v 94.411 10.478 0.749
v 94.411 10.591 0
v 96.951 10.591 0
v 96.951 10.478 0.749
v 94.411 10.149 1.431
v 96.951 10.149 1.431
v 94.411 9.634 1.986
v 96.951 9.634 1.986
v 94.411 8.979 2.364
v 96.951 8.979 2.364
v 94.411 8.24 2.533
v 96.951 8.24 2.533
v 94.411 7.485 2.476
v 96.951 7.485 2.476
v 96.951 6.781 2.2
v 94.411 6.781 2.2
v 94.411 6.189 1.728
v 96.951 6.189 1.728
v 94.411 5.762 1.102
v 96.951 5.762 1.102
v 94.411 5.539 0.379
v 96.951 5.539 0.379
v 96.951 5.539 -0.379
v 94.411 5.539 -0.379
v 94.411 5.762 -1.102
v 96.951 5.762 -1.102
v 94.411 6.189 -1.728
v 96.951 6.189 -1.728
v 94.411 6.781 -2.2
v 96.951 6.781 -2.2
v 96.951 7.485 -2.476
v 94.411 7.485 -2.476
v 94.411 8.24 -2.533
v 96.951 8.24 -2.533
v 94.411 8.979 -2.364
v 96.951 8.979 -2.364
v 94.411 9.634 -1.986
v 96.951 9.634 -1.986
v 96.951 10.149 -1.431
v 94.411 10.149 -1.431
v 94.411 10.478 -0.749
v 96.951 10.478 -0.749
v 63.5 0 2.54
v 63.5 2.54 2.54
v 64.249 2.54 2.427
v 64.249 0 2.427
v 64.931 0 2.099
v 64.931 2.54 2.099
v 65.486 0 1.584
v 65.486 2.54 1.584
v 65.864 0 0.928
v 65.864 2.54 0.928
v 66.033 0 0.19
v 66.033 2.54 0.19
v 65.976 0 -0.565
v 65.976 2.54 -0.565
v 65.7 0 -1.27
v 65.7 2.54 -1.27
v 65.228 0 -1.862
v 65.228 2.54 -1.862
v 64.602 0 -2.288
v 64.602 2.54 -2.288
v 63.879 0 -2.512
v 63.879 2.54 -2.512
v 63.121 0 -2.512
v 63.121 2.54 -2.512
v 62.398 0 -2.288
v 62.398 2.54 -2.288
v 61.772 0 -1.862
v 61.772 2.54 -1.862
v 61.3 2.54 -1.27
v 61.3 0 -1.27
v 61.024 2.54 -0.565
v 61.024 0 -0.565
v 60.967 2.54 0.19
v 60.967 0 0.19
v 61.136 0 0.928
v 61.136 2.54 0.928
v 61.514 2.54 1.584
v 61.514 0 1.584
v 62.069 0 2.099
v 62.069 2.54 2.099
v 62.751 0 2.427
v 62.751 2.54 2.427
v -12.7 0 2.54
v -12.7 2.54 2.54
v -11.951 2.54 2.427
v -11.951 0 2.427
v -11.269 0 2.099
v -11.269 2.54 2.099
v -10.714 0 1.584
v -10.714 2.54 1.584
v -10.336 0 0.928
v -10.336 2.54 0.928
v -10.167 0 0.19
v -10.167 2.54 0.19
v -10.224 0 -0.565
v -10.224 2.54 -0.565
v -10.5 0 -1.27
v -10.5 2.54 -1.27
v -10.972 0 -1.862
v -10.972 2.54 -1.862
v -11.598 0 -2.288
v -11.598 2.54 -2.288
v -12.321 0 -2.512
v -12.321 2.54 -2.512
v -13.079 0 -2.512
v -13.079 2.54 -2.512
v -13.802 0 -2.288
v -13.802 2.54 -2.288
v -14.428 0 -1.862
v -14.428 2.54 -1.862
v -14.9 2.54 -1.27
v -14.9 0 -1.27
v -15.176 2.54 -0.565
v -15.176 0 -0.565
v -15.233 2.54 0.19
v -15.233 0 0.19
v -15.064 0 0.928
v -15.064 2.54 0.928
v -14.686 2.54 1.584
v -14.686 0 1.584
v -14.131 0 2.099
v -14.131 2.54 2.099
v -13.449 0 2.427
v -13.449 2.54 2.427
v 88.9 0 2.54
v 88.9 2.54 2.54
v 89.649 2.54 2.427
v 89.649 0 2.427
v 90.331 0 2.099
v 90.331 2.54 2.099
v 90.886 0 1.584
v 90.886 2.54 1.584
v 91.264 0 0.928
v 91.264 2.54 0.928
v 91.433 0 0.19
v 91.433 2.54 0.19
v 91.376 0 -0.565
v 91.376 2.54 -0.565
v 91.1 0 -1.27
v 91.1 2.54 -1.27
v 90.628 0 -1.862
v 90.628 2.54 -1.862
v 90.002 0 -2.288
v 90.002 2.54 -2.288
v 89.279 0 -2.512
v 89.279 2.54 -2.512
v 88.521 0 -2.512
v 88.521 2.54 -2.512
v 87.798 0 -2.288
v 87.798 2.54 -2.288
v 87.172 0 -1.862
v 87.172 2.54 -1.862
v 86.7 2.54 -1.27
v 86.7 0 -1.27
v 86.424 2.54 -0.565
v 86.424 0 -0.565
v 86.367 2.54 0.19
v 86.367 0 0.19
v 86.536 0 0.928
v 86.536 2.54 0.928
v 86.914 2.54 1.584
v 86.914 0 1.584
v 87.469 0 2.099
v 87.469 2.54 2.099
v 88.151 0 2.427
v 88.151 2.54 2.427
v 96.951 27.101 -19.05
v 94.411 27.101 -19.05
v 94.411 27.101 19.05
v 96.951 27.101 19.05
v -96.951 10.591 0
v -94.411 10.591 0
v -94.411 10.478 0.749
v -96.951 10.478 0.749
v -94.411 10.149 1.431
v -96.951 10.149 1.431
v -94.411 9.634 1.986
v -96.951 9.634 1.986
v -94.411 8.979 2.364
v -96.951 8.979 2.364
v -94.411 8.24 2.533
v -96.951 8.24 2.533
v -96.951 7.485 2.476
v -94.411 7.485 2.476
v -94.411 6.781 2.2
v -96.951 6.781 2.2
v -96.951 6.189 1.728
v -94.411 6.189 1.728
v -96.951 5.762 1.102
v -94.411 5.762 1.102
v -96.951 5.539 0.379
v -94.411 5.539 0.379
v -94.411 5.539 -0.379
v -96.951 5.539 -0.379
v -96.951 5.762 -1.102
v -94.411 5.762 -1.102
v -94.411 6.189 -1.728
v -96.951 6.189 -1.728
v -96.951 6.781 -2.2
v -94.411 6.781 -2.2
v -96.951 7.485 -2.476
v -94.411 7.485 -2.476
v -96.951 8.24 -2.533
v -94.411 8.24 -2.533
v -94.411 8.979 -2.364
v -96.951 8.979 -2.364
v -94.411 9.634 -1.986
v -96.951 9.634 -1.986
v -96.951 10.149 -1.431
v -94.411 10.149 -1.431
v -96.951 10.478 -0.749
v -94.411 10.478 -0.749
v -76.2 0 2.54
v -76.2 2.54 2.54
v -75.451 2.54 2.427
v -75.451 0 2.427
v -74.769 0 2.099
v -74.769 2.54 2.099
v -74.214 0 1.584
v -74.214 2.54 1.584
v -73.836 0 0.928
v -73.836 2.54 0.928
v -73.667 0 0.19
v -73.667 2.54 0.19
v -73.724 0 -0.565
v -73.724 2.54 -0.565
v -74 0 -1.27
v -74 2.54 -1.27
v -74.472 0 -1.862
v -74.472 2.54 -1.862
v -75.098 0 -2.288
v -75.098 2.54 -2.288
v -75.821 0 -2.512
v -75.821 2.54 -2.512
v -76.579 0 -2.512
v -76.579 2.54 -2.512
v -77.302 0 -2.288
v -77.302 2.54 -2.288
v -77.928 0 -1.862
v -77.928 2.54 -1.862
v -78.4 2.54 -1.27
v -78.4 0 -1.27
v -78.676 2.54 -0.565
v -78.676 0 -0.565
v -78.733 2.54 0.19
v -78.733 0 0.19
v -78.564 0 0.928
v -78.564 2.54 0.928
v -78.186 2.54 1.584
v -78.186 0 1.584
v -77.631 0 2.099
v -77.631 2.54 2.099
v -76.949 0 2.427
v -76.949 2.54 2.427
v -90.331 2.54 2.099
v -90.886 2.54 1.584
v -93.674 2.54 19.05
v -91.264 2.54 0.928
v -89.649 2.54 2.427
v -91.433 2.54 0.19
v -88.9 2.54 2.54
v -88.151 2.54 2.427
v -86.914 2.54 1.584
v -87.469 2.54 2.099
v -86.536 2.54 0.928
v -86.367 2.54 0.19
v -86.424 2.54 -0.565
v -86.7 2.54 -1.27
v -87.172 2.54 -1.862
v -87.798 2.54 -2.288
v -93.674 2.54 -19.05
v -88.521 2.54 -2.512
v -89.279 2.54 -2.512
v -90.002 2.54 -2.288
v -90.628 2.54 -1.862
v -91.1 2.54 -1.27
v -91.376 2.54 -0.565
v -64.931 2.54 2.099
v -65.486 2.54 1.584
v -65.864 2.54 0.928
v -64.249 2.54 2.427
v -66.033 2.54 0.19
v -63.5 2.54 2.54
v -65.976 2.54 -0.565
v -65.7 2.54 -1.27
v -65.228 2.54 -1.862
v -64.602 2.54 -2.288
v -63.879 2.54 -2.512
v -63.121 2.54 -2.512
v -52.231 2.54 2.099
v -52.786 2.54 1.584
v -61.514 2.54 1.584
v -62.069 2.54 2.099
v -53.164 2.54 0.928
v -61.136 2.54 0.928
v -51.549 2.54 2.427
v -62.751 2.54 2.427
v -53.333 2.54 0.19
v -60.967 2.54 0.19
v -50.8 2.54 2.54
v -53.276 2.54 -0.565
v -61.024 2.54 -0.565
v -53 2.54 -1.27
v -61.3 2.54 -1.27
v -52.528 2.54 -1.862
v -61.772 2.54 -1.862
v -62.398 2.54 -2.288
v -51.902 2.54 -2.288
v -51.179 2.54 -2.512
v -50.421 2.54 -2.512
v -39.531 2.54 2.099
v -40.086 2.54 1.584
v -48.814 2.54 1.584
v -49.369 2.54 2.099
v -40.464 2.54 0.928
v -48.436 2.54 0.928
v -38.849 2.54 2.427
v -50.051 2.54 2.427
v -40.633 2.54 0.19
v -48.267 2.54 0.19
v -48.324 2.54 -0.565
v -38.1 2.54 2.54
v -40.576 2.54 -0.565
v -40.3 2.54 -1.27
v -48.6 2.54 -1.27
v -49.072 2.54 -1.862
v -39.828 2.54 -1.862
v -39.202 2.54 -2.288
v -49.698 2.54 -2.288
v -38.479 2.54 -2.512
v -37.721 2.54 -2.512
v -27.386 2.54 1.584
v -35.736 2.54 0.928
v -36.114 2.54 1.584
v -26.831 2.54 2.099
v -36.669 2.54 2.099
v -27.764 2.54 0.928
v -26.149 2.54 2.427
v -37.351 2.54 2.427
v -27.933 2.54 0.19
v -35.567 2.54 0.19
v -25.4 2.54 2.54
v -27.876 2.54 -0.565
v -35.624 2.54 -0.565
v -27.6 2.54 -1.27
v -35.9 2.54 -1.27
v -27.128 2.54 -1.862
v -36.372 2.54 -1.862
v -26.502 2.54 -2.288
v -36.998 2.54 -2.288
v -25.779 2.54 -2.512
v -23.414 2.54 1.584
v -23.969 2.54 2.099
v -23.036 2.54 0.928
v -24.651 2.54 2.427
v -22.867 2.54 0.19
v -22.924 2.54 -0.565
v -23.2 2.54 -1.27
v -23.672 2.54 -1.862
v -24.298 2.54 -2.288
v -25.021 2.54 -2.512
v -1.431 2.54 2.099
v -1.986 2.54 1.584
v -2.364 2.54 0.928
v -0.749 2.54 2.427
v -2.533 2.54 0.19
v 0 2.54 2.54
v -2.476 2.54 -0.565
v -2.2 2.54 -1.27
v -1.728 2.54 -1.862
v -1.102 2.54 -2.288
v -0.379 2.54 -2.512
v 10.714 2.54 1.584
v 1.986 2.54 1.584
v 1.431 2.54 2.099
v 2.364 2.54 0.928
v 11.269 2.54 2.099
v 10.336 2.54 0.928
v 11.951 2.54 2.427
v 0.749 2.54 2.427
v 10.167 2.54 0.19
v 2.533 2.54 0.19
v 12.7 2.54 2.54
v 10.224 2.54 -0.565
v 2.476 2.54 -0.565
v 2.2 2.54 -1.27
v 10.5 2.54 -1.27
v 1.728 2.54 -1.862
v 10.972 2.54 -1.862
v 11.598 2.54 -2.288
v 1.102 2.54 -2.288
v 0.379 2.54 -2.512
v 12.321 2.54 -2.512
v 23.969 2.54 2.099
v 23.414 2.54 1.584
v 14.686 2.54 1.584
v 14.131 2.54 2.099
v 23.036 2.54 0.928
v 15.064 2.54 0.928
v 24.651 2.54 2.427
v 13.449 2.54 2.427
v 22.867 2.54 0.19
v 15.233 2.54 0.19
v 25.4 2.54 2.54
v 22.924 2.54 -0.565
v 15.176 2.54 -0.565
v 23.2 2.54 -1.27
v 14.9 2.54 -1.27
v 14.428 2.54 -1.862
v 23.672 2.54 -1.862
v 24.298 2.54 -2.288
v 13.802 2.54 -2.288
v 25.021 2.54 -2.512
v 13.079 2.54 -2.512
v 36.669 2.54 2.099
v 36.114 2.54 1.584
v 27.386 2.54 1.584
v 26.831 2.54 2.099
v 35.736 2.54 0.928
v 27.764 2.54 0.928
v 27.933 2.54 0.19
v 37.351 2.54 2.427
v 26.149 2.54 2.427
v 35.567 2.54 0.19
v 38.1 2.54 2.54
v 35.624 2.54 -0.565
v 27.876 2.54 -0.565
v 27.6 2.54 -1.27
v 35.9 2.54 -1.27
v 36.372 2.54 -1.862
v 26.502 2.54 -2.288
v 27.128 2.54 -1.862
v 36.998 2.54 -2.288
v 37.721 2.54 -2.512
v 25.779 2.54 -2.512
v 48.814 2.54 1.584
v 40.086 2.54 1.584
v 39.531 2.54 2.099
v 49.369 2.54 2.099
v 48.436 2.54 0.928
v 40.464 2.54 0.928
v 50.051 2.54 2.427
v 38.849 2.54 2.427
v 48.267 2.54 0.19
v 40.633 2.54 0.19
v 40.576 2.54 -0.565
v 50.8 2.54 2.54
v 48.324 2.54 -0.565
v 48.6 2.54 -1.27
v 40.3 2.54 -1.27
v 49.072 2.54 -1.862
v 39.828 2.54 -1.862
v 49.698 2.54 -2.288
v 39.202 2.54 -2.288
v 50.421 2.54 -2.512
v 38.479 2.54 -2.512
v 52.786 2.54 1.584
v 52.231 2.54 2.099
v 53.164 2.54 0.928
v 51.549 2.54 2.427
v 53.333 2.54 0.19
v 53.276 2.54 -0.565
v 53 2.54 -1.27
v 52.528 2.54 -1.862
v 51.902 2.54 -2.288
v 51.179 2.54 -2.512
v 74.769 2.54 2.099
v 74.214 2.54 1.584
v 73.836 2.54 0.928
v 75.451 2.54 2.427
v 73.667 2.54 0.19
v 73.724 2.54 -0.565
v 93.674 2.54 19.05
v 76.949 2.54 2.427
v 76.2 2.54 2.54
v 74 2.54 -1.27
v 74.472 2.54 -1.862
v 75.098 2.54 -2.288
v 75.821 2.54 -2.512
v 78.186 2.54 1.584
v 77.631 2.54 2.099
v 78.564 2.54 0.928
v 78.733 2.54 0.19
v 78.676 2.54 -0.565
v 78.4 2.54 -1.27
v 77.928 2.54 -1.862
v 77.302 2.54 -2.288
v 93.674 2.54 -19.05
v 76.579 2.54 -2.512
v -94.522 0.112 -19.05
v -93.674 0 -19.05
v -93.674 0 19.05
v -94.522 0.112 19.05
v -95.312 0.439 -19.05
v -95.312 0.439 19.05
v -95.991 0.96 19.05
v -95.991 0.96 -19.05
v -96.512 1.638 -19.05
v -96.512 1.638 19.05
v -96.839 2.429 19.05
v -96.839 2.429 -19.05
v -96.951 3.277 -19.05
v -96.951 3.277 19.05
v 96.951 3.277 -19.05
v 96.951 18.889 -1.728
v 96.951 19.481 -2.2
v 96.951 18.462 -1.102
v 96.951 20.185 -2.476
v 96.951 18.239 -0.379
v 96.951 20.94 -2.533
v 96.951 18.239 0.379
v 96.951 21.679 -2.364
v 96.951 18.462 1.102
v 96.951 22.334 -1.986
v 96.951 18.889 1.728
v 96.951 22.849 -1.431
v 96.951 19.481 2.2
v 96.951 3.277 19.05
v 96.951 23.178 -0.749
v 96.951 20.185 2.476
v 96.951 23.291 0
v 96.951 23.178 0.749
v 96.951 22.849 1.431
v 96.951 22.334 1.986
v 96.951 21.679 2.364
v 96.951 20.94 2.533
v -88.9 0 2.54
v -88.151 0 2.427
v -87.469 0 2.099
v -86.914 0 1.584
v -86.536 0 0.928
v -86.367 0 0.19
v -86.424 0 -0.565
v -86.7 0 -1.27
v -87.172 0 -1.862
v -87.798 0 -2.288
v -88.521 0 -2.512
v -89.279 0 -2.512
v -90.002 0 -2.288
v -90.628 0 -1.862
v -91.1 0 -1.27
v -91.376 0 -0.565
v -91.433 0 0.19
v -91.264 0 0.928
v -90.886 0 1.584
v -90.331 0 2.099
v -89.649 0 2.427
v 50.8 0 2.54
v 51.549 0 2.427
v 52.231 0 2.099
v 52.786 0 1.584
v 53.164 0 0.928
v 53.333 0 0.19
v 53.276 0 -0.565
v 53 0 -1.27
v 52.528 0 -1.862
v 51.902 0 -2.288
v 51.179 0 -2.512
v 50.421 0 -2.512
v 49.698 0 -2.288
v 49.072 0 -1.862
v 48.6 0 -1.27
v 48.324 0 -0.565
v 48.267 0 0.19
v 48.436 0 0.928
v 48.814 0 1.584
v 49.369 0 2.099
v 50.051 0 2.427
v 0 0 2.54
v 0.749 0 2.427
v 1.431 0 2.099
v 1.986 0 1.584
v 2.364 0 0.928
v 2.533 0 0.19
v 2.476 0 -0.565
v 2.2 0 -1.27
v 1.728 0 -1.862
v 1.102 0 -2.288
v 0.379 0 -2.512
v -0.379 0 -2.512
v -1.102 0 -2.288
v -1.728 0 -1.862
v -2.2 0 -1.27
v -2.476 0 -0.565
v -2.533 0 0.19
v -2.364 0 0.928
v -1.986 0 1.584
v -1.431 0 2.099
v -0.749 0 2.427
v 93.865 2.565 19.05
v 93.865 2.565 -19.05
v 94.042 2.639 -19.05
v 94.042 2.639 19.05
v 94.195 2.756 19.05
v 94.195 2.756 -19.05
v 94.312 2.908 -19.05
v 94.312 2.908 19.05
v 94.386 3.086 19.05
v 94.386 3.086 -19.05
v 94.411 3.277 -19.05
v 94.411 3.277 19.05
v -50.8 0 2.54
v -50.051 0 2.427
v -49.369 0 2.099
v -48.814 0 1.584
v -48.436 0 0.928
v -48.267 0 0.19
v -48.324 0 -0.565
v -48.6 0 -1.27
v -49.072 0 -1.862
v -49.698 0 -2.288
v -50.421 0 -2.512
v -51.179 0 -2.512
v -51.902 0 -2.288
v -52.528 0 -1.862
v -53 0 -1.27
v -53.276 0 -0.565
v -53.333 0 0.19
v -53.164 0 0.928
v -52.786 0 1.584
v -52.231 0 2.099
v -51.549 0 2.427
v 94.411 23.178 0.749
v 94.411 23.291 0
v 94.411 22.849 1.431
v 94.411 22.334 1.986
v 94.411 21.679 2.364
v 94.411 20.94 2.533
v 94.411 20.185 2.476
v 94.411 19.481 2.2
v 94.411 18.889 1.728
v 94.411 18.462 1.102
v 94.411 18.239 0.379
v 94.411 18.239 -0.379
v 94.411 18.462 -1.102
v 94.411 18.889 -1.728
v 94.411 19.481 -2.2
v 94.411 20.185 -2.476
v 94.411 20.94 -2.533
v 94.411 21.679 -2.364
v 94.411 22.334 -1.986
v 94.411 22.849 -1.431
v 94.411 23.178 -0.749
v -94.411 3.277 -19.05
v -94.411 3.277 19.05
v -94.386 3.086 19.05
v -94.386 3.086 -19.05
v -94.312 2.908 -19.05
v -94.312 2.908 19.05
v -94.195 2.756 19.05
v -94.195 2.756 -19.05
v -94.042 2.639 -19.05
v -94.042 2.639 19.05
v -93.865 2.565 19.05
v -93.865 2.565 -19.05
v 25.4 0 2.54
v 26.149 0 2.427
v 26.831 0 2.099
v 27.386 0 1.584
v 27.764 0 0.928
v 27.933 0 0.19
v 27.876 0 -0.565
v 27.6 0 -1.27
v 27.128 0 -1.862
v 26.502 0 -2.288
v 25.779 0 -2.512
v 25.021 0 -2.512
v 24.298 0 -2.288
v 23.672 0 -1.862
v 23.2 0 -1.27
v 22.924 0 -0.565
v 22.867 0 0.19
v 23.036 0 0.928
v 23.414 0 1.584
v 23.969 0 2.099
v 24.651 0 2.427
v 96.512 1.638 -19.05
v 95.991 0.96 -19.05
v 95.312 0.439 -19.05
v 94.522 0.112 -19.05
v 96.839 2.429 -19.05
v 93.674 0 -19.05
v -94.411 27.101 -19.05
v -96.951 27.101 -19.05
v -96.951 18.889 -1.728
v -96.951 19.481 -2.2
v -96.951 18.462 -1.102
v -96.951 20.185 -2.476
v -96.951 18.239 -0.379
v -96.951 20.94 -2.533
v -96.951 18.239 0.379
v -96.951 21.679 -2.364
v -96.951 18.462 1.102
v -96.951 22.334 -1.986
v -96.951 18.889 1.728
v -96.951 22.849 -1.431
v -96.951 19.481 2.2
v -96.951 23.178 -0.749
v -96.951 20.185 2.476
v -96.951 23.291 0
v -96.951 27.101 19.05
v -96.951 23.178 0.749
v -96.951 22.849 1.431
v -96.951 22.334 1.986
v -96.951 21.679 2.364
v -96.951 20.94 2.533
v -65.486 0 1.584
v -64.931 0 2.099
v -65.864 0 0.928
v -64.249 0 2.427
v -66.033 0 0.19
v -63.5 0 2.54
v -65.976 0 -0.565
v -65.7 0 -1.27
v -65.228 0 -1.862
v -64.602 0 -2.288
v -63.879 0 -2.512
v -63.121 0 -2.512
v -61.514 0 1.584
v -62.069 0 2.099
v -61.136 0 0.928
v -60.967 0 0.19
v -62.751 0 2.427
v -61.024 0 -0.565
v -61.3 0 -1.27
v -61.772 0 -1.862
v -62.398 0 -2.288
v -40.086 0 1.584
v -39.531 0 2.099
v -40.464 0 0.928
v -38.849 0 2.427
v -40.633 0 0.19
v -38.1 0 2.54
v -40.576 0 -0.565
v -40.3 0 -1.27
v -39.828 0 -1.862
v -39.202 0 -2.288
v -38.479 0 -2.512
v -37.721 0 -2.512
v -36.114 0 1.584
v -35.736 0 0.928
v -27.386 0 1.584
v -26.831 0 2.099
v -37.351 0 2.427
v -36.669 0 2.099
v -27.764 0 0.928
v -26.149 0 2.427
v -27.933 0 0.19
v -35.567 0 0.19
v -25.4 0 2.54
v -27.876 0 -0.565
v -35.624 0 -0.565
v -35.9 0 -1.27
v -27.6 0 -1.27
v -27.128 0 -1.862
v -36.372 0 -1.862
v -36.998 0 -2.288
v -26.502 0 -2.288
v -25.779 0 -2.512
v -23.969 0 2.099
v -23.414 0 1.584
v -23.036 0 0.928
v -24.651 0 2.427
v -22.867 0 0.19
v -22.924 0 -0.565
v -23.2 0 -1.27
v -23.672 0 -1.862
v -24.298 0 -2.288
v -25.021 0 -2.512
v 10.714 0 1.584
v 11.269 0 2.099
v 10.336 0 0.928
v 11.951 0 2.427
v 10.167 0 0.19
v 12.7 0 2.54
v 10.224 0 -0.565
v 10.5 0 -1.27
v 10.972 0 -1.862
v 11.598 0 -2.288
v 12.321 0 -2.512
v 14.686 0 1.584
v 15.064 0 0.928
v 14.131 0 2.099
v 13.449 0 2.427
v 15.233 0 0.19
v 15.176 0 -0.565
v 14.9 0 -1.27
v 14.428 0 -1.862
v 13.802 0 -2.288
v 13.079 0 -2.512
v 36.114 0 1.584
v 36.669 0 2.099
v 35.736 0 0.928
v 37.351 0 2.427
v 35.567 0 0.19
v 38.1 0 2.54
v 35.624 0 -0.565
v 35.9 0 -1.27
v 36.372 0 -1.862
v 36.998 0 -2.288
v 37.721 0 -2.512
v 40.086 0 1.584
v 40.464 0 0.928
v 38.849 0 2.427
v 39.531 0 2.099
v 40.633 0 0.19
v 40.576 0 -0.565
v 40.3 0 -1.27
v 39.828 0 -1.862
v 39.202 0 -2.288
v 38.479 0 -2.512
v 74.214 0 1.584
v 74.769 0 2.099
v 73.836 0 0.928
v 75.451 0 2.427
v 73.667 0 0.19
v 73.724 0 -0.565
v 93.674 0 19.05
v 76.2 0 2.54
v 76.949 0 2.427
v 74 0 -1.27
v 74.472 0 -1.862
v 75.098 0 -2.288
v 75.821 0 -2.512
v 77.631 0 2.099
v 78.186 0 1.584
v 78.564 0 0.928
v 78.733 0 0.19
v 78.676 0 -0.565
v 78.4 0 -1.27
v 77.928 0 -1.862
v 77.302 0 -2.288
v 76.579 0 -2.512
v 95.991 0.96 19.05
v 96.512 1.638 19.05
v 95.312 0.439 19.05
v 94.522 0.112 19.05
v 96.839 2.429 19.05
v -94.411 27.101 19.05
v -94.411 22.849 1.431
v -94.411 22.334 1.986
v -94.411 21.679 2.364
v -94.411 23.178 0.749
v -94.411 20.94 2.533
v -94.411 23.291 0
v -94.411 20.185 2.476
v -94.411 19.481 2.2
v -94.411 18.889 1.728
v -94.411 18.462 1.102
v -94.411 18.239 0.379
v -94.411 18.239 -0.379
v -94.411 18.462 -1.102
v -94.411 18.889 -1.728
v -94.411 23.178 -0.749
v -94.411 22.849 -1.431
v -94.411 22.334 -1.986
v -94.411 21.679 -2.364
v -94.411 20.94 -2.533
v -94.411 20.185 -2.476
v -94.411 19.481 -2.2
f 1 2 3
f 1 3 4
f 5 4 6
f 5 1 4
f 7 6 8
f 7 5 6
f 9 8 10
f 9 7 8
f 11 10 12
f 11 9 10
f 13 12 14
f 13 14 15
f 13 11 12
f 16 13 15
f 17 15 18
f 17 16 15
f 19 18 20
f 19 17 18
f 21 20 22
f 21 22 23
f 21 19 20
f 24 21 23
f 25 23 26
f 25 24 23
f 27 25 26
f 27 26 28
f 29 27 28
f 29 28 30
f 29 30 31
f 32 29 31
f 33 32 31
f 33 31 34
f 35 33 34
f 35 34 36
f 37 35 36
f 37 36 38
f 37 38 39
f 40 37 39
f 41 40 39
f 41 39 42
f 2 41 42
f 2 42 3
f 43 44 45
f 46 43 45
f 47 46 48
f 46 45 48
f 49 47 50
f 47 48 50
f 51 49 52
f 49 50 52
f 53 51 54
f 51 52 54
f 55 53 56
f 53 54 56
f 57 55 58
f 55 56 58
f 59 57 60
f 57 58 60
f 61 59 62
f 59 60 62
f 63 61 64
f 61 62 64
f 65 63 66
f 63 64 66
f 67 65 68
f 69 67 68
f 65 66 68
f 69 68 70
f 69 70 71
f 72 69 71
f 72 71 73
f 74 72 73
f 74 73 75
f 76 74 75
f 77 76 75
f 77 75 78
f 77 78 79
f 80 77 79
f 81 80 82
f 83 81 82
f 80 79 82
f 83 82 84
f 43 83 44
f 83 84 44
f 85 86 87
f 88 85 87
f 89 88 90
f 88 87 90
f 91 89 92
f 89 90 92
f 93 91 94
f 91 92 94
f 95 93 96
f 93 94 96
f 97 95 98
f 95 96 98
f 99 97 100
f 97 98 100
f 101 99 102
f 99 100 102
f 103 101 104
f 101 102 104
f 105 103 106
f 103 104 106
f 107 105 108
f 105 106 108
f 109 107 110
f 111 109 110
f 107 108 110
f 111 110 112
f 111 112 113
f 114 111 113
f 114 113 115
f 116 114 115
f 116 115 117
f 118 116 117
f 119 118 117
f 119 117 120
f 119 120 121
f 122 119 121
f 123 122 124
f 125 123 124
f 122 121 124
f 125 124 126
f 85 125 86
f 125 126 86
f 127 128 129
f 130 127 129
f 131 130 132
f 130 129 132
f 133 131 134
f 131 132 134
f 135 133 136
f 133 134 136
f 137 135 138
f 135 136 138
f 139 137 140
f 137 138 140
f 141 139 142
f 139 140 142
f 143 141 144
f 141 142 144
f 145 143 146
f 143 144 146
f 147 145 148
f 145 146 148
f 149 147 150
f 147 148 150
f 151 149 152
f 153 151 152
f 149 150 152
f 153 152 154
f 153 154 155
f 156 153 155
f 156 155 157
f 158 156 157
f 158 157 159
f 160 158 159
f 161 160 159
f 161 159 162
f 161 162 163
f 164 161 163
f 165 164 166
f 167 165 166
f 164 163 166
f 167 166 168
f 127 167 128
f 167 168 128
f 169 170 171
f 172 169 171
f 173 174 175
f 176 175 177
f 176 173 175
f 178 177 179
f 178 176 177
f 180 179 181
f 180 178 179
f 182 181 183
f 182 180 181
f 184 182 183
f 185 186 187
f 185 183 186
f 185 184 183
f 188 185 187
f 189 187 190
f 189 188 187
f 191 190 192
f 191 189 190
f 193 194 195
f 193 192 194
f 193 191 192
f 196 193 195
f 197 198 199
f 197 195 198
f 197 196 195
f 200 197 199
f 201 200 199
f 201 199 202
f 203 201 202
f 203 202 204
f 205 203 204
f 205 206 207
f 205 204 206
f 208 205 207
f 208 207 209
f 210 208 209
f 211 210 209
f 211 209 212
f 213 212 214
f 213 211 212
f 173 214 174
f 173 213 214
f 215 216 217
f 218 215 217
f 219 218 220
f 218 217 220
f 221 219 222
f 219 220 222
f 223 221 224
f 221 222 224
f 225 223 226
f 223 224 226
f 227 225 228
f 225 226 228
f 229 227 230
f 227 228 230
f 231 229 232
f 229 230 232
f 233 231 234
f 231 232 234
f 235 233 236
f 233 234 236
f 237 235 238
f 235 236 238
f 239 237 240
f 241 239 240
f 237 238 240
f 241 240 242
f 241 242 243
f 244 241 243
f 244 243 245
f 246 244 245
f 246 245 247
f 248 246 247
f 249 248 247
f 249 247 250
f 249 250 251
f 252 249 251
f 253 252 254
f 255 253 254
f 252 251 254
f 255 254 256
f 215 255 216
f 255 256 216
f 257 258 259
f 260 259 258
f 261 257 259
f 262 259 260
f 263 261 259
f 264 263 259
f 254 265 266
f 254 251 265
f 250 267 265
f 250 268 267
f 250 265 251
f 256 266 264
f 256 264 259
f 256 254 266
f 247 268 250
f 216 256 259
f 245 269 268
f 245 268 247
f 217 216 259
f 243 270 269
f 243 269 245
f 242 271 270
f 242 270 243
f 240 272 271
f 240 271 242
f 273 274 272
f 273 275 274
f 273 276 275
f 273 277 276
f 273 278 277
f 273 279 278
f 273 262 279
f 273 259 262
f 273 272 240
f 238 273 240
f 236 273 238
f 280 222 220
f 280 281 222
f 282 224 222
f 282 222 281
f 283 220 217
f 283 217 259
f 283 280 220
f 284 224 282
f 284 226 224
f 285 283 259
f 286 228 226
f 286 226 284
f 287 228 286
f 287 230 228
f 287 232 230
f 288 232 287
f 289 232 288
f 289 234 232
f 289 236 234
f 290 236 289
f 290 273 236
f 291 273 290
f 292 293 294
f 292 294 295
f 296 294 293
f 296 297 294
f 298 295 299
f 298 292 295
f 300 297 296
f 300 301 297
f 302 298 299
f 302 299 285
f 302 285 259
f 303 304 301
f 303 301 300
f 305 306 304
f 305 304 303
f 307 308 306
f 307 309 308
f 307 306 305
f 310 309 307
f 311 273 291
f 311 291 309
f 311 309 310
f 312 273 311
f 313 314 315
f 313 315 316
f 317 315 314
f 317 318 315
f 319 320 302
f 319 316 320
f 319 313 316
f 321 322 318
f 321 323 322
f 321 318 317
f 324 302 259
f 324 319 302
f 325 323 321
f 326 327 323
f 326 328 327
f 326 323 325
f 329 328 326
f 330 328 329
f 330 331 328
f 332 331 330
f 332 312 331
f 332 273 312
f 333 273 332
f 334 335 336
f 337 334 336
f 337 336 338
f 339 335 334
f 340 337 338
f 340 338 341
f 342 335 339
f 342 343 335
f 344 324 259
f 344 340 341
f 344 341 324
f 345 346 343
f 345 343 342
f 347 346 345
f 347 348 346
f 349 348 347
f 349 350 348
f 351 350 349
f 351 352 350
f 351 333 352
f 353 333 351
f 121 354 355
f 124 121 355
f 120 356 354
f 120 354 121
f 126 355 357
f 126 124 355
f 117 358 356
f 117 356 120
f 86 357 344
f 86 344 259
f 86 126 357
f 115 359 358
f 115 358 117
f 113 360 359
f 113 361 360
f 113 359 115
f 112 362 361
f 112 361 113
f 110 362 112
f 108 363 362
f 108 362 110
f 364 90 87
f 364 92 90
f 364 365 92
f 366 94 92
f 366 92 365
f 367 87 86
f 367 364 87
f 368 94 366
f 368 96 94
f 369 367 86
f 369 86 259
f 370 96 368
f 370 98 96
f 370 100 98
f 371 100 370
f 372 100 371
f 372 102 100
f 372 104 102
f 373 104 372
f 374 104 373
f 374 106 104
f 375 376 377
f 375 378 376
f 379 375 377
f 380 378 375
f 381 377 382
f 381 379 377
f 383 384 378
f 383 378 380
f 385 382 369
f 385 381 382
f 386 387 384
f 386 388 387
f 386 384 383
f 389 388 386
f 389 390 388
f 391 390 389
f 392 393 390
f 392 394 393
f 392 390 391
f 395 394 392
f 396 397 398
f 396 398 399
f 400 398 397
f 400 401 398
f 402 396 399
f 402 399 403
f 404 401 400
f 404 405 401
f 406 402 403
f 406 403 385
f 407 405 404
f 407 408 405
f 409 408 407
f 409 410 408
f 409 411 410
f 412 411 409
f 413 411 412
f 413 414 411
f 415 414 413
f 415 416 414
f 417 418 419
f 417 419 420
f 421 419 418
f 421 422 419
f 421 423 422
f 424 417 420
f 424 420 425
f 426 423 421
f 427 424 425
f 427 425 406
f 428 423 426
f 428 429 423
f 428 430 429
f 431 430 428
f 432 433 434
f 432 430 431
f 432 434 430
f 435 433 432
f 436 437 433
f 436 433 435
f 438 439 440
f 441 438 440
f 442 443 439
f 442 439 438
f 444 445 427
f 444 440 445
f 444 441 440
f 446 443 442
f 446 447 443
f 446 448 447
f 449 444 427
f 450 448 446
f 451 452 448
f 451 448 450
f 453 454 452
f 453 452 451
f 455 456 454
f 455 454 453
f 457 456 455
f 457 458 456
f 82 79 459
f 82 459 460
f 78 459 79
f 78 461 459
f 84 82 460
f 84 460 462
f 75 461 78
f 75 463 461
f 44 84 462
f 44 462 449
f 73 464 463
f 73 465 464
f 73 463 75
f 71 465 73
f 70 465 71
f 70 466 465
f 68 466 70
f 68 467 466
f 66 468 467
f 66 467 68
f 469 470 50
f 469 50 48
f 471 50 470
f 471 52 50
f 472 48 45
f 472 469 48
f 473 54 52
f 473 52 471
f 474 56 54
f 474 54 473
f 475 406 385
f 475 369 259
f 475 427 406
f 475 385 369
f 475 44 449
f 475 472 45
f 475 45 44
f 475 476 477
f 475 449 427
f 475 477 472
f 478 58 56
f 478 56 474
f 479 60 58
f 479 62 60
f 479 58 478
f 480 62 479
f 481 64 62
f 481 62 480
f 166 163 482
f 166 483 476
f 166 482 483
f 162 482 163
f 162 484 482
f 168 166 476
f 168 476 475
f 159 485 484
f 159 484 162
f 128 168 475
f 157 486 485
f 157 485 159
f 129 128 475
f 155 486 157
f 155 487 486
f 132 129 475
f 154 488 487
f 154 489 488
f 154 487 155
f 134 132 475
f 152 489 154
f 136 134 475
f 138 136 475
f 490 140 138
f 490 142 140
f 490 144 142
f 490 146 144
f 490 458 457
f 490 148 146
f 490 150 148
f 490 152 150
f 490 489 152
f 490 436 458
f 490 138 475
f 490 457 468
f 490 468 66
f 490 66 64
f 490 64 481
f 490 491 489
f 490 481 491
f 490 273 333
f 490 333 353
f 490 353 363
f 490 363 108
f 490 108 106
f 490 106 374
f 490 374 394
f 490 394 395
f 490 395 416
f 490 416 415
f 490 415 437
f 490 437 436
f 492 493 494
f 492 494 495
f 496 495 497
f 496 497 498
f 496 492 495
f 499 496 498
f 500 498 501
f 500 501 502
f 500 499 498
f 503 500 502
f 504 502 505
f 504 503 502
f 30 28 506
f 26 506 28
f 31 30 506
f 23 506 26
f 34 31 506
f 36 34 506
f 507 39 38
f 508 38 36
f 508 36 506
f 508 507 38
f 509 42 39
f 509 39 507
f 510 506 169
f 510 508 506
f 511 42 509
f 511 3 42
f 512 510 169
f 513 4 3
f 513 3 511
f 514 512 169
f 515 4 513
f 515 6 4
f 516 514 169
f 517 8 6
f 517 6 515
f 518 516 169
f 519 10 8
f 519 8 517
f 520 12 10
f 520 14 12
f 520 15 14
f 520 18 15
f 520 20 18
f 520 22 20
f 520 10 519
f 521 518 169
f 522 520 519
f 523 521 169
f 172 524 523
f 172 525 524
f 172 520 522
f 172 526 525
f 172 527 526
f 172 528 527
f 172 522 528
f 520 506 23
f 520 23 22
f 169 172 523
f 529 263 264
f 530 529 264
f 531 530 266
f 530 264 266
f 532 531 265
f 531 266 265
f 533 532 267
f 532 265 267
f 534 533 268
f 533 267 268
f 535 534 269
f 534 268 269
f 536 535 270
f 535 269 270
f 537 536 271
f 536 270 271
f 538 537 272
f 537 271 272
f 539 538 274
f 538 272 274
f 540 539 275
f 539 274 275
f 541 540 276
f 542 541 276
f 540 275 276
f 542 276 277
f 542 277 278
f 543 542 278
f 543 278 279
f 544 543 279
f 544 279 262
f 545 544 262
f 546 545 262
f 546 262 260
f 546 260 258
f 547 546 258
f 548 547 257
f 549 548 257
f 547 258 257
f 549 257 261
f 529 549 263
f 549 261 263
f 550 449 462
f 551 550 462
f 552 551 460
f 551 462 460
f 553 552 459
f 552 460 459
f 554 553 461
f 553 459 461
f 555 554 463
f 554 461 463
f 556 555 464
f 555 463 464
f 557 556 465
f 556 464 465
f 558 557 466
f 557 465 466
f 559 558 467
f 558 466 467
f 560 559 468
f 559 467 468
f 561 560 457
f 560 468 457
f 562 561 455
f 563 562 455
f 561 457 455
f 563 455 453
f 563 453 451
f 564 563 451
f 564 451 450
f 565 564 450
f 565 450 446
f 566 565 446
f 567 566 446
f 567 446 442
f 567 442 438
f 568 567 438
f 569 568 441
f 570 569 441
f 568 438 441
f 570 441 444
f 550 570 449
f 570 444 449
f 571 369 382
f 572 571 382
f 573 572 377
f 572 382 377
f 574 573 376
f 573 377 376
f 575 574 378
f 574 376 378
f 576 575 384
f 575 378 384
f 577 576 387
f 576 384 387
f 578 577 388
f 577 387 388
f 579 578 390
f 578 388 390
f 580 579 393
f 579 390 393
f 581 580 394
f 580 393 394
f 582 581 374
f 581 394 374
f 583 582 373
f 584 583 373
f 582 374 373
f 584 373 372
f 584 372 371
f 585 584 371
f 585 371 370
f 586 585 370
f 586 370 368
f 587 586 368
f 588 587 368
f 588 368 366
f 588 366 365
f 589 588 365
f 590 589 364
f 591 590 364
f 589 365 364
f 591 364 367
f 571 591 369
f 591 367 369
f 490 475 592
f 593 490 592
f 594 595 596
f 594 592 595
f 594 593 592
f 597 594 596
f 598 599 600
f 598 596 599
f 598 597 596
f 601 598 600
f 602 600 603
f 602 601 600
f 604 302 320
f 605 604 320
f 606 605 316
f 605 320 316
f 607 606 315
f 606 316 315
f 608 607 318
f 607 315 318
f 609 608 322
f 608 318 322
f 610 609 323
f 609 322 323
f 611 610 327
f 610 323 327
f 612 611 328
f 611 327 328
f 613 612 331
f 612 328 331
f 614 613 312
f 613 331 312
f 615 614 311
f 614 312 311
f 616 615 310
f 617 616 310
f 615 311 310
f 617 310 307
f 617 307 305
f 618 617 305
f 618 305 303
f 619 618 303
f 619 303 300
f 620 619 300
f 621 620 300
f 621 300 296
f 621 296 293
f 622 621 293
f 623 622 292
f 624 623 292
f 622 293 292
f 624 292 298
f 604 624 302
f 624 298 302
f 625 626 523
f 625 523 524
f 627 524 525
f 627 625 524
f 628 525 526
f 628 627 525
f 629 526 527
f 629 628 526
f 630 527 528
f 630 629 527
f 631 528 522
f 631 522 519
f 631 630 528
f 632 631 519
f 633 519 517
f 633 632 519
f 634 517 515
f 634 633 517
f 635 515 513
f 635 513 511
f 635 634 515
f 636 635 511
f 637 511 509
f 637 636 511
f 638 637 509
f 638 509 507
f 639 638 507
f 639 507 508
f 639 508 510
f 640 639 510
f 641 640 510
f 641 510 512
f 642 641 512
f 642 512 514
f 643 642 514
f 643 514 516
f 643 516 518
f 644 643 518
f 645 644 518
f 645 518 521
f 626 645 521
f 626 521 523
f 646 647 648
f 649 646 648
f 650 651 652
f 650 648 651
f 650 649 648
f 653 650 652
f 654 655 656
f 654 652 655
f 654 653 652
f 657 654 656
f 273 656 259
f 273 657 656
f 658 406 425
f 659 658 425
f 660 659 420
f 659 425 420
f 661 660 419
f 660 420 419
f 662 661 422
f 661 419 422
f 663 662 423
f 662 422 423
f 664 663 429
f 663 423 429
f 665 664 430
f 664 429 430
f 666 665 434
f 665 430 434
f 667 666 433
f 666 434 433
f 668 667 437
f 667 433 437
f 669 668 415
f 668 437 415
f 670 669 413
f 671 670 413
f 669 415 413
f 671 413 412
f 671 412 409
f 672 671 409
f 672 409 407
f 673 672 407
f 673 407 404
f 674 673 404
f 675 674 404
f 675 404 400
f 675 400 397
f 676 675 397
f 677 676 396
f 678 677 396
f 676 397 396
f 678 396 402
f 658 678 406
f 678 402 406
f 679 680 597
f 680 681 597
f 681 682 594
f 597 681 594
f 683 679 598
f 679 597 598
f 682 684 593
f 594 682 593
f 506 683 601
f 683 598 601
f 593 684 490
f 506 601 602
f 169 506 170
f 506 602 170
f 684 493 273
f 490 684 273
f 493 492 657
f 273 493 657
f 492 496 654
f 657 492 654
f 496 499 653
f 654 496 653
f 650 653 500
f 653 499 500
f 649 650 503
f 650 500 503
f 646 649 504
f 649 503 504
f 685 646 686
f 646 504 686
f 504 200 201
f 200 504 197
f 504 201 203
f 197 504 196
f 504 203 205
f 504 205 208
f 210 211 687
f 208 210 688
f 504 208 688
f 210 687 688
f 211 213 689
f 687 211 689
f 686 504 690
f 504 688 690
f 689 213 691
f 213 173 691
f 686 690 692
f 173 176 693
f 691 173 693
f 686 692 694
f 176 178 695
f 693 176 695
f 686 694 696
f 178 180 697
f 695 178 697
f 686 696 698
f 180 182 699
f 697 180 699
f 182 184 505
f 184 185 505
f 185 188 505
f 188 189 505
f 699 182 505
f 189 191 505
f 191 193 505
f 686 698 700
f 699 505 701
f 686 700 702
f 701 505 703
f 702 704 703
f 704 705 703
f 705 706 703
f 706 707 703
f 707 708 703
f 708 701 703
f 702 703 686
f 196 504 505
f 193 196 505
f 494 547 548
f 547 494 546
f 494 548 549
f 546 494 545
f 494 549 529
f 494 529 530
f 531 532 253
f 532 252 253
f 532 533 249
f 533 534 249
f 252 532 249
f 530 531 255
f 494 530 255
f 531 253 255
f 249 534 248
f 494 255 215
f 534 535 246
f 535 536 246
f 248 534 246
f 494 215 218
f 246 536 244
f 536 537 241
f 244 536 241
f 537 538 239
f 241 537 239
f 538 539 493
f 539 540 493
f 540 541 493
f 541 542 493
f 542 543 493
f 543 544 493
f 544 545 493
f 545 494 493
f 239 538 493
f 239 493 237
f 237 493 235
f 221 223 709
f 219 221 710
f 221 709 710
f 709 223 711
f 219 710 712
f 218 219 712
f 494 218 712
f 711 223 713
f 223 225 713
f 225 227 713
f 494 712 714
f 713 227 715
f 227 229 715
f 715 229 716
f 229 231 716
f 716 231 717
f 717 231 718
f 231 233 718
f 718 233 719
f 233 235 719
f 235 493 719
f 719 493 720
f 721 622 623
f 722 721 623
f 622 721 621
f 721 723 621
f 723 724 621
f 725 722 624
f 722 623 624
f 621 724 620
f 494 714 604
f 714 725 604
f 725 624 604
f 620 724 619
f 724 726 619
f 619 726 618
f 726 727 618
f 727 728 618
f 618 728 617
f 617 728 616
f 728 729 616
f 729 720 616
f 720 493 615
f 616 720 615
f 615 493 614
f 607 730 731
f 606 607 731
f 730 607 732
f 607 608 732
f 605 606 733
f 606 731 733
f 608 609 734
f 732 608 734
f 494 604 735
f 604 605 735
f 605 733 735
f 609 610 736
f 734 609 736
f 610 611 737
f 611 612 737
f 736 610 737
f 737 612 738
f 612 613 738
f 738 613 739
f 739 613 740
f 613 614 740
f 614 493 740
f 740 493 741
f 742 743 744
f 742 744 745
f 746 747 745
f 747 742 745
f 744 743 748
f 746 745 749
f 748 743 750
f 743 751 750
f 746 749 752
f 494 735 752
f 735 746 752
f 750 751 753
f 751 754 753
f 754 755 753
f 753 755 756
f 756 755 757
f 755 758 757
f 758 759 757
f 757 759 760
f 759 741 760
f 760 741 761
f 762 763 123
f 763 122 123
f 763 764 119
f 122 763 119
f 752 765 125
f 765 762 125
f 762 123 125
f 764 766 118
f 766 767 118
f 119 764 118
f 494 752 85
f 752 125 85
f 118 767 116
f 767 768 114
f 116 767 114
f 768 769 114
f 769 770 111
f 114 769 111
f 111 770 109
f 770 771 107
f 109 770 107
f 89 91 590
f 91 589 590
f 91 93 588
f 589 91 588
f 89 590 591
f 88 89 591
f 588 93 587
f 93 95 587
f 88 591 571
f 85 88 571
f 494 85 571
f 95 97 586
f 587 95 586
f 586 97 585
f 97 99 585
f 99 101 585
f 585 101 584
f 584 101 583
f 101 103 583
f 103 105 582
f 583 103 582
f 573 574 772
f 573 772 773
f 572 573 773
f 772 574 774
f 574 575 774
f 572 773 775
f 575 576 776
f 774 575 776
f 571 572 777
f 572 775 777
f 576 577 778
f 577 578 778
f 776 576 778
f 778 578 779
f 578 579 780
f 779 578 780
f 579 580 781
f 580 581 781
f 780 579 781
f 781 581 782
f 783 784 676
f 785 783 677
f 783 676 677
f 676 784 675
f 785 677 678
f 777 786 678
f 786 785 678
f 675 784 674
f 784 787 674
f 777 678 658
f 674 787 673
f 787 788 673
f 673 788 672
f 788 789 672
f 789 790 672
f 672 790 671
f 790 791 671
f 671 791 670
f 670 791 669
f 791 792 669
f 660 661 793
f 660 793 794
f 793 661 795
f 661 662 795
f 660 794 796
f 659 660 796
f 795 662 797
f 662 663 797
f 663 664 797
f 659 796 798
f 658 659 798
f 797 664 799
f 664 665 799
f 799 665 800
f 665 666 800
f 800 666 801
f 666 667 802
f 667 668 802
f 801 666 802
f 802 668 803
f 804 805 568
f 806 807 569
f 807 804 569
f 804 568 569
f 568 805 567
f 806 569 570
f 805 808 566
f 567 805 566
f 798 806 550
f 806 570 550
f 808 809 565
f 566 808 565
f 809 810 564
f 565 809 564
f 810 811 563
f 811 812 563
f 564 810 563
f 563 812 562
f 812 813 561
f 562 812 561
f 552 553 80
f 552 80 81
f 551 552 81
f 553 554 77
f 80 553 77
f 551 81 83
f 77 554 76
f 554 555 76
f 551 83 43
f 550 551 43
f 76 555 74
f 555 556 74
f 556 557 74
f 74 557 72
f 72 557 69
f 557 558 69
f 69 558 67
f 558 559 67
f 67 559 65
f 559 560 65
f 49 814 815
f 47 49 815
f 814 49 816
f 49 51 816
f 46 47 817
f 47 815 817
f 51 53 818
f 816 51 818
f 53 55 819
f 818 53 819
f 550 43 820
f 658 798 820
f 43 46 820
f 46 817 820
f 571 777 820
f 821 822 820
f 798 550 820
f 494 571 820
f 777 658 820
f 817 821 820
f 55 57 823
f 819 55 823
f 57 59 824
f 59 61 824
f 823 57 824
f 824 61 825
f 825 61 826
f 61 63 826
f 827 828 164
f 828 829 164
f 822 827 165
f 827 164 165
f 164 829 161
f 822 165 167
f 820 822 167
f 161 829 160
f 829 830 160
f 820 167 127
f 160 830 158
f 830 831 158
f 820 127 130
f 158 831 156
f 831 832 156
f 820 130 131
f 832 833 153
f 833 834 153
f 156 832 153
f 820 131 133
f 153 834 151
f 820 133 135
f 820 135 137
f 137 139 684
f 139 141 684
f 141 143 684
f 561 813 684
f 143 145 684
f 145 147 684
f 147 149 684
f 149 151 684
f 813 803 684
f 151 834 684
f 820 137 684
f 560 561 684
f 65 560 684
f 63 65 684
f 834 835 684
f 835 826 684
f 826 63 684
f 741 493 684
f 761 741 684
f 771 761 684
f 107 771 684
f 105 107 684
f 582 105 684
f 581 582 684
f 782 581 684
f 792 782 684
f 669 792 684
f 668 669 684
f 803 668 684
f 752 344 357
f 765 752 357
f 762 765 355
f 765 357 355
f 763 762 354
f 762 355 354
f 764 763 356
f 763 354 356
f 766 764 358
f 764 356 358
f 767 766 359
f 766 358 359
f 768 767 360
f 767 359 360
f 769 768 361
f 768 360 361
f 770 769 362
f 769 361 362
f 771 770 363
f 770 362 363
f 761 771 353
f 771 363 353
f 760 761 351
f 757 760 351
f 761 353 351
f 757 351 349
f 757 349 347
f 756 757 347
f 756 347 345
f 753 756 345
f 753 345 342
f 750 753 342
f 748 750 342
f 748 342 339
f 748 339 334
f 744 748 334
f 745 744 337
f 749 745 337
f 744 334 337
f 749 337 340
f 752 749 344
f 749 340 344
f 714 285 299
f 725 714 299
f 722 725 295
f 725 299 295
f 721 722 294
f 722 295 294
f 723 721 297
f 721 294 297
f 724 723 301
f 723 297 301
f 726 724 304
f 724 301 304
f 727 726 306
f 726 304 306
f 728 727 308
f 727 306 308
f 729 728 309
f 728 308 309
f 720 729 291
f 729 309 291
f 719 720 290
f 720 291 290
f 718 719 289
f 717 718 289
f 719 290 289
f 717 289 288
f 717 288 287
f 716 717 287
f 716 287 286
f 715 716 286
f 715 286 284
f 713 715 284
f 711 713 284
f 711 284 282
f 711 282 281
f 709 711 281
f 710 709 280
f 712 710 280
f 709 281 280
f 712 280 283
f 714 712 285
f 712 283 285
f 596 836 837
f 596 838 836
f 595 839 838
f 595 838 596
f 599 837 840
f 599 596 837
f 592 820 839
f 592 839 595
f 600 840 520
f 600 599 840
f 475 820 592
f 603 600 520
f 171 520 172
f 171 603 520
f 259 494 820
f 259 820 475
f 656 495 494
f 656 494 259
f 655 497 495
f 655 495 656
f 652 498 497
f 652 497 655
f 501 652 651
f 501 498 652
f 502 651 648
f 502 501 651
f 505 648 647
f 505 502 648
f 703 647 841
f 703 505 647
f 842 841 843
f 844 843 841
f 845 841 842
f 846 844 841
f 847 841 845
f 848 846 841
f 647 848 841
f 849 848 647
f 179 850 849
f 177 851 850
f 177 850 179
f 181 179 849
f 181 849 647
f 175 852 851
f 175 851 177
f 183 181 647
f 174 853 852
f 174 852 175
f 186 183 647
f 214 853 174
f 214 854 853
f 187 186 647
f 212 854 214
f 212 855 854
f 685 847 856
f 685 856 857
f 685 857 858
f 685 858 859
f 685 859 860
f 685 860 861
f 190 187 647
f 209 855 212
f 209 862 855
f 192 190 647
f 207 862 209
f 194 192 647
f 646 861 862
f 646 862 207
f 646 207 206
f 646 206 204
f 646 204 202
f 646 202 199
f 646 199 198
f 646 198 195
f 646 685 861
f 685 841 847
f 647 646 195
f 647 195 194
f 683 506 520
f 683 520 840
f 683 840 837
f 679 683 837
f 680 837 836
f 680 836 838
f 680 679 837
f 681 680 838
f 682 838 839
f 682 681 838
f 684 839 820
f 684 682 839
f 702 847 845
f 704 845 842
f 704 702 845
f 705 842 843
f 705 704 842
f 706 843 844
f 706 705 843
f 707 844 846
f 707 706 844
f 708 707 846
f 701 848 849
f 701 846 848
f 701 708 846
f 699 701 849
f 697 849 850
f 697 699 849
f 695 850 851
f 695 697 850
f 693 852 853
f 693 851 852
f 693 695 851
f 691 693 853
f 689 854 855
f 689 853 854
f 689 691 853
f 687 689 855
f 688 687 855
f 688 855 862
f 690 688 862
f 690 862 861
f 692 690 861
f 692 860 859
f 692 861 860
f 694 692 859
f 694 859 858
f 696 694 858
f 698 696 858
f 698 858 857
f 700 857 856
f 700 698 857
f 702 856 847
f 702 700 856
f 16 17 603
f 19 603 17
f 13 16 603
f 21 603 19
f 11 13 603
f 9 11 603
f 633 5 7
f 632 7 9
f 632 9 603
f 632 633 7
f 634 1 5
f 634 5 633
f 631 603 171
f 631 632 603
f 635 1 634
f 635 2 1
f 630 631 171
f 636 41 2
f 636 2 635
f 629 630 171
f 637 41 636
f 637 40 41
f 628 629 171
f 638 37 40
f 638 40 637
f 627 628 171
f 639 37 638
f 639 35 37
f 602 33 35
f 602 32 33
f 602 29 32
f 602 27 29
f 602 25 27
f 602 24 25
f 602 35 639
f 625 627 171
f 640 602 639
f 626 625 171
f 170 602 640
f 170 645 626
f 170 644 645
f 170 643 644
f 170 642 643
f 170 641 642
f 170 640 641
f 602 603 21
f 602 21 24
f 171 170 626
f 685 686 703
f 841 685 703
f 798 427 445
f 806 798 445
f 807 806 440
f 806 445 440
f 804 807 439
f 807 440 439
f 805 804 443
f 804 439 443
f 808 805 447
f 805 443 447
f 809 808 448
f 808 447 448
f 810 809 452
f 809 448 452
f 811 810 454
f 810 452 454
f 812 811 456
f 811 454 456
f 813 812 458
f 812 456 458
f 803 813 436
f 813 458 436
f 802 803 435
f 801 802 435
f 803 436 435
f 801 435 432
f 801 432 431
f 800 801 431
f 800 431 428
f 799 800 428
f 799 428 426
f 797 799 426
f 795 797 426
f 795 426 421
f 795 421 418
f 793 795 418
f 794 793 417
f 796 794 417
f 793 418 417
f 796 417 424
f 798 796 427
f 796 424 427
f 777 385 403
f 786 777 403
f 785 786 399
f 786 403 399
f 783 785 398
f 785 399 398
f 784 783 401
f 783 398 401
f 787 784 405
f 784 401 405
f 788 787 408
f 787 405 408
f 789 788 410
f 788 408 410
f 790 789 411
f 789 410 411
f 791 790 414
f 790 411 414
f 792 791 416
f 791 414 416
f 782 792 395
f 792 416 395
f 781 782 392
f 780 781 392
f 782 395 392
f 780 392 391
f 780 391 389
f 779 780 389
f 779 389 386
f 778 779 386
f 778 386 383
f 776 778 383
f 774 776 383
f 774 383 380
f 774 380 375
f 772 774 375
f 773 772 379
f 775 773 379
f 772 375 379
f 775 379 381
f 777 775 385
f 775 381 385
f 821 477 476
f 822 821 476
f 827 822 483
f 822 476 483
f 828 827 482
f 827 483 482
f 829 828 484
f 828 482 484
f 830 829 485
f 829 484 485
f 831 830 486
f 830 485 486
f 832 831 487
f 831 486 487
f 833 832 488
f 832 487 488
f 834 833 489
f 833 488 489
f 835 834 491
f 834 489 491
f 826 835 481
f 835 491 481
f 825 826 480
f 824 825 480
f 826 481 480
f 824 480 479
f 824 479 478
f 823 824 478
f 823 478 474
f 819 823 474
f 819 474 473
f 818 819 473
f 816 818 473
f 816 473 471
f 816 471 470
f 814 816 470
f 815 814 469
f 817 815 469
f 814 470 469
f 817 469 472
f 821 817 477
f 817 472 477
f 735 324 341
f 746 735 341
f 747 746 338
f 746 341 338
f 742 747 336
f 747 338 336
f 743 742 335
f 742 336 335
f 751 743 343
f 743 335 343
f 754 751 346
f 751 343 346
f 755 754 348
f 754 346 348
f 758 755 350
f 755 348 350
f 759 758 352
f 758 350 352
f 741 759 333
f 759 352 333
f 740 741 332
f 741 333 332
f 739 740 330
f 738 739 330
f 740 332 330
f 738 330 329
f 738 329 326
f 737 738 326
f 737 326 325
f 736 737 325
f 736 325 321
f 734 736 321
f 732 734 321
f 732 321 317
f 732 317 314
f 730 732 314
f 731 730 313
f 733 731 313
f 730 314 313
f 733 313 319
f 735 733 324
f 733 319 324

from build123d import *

# Parameters (mm, degrees)
SKETCH1_W                  = 241.3
SKETCH1_H                  = 38.1
BOSS_EXTRUDE1_DEPTH        = 2.54
SKETCH2_R                  = 2.54
CUT_EXTRUDE1_DEPTH         = 2.54
LPATTERN1_COUNT            = 19
LPATTERN1_PITCH            = 12.7
SKETCHED_START             = -120.65
SKETCHED_BEND2_OUTLINE_W   = 2.54
SKETCHED_BEND2_OUTLINE_H   = 38.1
SKETCHED_BEND2_DEPTH       = 23.699379955
SKETCHED_START_2           = -96.631937929
SKETCHED_BEND2_2_OUTLINE_W = 24.560620045
SKETCHED_BEND2_2_OUTLINE_H = 38.1
SKETCHED_BEND2_2_OUTLINE_R = 2.54
SKETCHED_BEND2_2_DEPTH     = 2.221317884
SKETCHED_START_3           = -96.950620045
SKETCHED_BEND2_3_OUTLINE_W = 24.560620045
SKETCHED_BEND2_3_OUTLINE_H = 38.1
SKETCHED_BEND2_3_OUTLINE_R = 2.54
SKETCHED_BEND2_3_DEPTH     = 3.2766
SKETCHED_START_4           = -20
SKETCHED_BEND2_4_DEPTH     = 40
SKETCHED_START_5           = 96.950620045
SKETCHED_BEND3_OUTLINE_W   = 2.54
SKETCHED_BEND3_OUTLINE_H   = 38.1
SKETCHED_BEND3_DEPTH       = 23.699379955
SKETCHED_START_6           = 94.410620045
SKETCHED_BEND3_2_OUTLINE_W = 24.560620045
SKETCHED_BEND3_2_OUTLINE_H = 38.1
SKETCHED_BEND3_2_OUTLINE_R = 2.54
SKETCHED_BEND3_2_DEPTH     = 2.221317884
SKETCHED_START_7           = 93.674020045
SKETCHED_BEND3_3_OUTLINE_W = 24.560620045
SKETCHED_BEND3_3_OUTLINE_H = 38.1
SKETCHED_BEND3_3_OUTLINE_R = 2.54
SKETCHED_BEND3_3_DEPTH     = 3.2766
SKETCHED_BEND3_4_DEPTH     = 40


with BuildPart() as part:
    # Sketch1 → Boss-Extrude1 (new body)
    with BuildSketch(Plane(origin=(0, 0, 0), x_dir=(1, 0, 0), z_dir=(0, 1, 0))):
        Rectangle(SKETCH1_W, SKETCH1_H)
    extrude(amount=BOSS_EXTRUDE1_DEPTH)

    # Sketch2 → Cut-Extrude1 (cut)
    with BuildSketch(Plane(origin=(0, 2.54, 0), x_dir=(1, 0, 0), z_dir=(0, 1, 0))):
        with Locations(Location((-114.3, 0, 0), (0, 0, 270))):
            Circle(SKETCH2_R)
    cut_extrude1 = extrude(amount=-CUT_EXTRUDE1_DEPTH, mode=Mode.SUBTRACT)

    # LPattern1: Cut-Extrude1 ×19
    with Locations(*[(i * LPATTERN1_PITCH, 0, 0) for i in range(1, LPATTERN1_COUNT)]):
        add(cut_extrude1, mode=Mode.SUBTRACT)

    # Sketched Bend2: read off the stored shape, not the designer's step
    # Sketched Bend2 outline → Sketched Bend2 (cut)
    with BuildSketch(Plane.YZ.offset(SKETCHED_START)):
        with Locations((1.27, 0)):
            Rectangle(SKETCHED_BEND2_OUTLINE_W, SKETCHED_BEND2_OUTLINE_H)
    extrude(amount=SKETCHED_BEND2_DEPTH, mode=Mode.SUBTRACT)

    # Sketched Bend2 2 outline → Sketched Bend2 2 (add)
    with BuildSketch(Plane.YZ.offset(SKETCHED_START_2)):
        with Locations((14.820310023, 0)):
            Rectangle(SKETCHED_BEND2_2_OUTLINE_W, SKETCHED_BEND2_2_OUTLINE_H)
        with Locations((8.050620045, 0)):
            Circle(SKETCHED_BEND2_2_OUTLINE_R, mode=Mode.SUBTRACT)
        with Locations((20.750620045, 0)):
            Circle(SKETCHED_BEND2_2_OUTLINE_R, mode=Mode.SUBTRACT)
    extrude(amount=SKETCHED_BEND2_2_DEPTH)

    # Sketched Bend2 3 outline → Sketched Bend2 3 (add)
    with BuildSketch(Plane.YZ.offset(SKETCHED_START_3)):
        with Locations((14.820310023, 0)):
            Rectangle(SKETCHED_BEND2_3_OUTLINE_W, SKETCHED_BEND2_3_OUTLINE_H)
        with Locations((8.050620045, 0)):
            Circle(SKETCHED_BEND2_3_OUTLINE_R, mode=Mode.SUBTRACT)
        with Locations((20.750620045, 0)):
            Circle(SKETCHED_BEND2_3_OUTLINE_R, mode=Mode.SUBTRACT)
    extrude(amount=SKETCHED_BEND2_3_DEPTH)

    # Sketched Bend2 4 outline → Sketched Bend2 4 (cut)
    with BuildSketch(Plane.XY.offset(SKETCHED_START_4)):
        with BuildLine():
            Line((-93.674020045, 27.100620045), (-94.410620045, 27.100620045))
            Line((-94.410620045, 27.100620045), (-94.410620045, 3.2766))
            ThreePointArc((-94.410620045, 3.2766), (-94.1948749, 2.755745145), (-93.674020045, 2.54))
            Line((-93.674020045, 2.54), (-93.674020045, 27.100620045))
        make_face()
        with BuildLine():
            ThreePointArc((-93.674020045, 0), (-95.990926125, 0.95969392), (-96.950620045, 3.2766))
            Line((-96.950620045, 3.2766), (-96.950620045, 0))
            Line((-96.950620045, 0), (-93.674020045, 0))
        make_face()
    extrude(amount=SKETCHED_BEND2_4_DEPTH, mode=Mode.SUBTRACT)

    # Sketched Bend3: read off the stored shape, not the designer's step
    # Sketched Bend3 outline → Sketched Bend3 (cut)
    with BuildSketch(Plane.YZ.offset(SKETCHED_START_5)):
        with Locations((1.27, 0)):
            Rectangle(SKETCHED_BEND3_OUTLINE_W, SKETCHED_BEND3_OUTLINE_H)
    extrude(amount=SKETCHED_BEND3_DEPTH, mode=Mode.SUBTRACT)

    # Sketched Bend3 2 outline → Sketched Bend3 2 (add)
    with BuildSketch(Plane.YZ.offset(SKETCHED_START_6)):
        with Locations((14.820310023, 0)):
            Rectangle(SKETCHED_BEND3_2_OUTLINE_W, SKETCHED_BEND3_2_OUTLINE_H)
        with Locations((8.050620045, 0)):
            Circle(SKETCHED_BEND3_2_OUTLINE_R, mode=Mode.SUBTRACT)
        with Locations((20.750620045, 0)):
            Circle(SKETCHED_BEND3_2_OUTLINE_R, mode=Mode.SUBTRACT)
    extrude(amount=SKETCHED_BEND3_2_DEPTH)

    # Sketched Bend3 3 outline → Sketched Bend3 3 (add)
    with BuildSketch(Plane.YZ.offset(SKETCHED_START_7)):
        with Locations((14.820310023, 0)):
            Rectangle(SKETCHED_BEND3_3_OUTLINE_W, SKETCHED_BEND3_3_OUTLINE_H)
        with Locations((8.050620045, 0)):
            Circle(SKETCHED_BEND3_3_OUTLINE_R, mode=Mode.SUBTRACT)
        with Locations((20.750620045, 0)):
            Circle(SKETCHED_BEND3_3_OUTLINE_R, mode=Mode.SUBTRACT)
    extrude(amount=SKETCHED_BEND3_3_DEPTH)

    # Sketched Bend3 4 outline → Sketched Bend3 4 (cut)
    with BuildSketch(Plane.XY.offset(SKETCHED_START_4)):
        with BuildLine():
            Line((96.950620045, 0), (96.950620045, 3.2766))
            ThreePointArc((96.950620045, 3.2766), (95.990926125, 0.95969392), (93.674020045, 0))
            Line((93.674020045, 0), (96.950620045, 0))
        make_face()
        with BuildLine():
            ThreePointArc((93.674020045, 2.54), (94.1948749, 2.755745145), (94.410620045, 3.2766))
            Line((94.410620045, 3.2766), (94.410620045, 27.100620045))
            Line((94.410620045, 27.100620045), (93.674020045, 27.100620045))
            Line((93.674020045, 27.100620045), (93.674020045, 2.54))
        make_face()
    extrude(amount=SKETCHED_BEND3_4_DEPTH, mode=Mode.SUBTRACT)


solid = part.part
